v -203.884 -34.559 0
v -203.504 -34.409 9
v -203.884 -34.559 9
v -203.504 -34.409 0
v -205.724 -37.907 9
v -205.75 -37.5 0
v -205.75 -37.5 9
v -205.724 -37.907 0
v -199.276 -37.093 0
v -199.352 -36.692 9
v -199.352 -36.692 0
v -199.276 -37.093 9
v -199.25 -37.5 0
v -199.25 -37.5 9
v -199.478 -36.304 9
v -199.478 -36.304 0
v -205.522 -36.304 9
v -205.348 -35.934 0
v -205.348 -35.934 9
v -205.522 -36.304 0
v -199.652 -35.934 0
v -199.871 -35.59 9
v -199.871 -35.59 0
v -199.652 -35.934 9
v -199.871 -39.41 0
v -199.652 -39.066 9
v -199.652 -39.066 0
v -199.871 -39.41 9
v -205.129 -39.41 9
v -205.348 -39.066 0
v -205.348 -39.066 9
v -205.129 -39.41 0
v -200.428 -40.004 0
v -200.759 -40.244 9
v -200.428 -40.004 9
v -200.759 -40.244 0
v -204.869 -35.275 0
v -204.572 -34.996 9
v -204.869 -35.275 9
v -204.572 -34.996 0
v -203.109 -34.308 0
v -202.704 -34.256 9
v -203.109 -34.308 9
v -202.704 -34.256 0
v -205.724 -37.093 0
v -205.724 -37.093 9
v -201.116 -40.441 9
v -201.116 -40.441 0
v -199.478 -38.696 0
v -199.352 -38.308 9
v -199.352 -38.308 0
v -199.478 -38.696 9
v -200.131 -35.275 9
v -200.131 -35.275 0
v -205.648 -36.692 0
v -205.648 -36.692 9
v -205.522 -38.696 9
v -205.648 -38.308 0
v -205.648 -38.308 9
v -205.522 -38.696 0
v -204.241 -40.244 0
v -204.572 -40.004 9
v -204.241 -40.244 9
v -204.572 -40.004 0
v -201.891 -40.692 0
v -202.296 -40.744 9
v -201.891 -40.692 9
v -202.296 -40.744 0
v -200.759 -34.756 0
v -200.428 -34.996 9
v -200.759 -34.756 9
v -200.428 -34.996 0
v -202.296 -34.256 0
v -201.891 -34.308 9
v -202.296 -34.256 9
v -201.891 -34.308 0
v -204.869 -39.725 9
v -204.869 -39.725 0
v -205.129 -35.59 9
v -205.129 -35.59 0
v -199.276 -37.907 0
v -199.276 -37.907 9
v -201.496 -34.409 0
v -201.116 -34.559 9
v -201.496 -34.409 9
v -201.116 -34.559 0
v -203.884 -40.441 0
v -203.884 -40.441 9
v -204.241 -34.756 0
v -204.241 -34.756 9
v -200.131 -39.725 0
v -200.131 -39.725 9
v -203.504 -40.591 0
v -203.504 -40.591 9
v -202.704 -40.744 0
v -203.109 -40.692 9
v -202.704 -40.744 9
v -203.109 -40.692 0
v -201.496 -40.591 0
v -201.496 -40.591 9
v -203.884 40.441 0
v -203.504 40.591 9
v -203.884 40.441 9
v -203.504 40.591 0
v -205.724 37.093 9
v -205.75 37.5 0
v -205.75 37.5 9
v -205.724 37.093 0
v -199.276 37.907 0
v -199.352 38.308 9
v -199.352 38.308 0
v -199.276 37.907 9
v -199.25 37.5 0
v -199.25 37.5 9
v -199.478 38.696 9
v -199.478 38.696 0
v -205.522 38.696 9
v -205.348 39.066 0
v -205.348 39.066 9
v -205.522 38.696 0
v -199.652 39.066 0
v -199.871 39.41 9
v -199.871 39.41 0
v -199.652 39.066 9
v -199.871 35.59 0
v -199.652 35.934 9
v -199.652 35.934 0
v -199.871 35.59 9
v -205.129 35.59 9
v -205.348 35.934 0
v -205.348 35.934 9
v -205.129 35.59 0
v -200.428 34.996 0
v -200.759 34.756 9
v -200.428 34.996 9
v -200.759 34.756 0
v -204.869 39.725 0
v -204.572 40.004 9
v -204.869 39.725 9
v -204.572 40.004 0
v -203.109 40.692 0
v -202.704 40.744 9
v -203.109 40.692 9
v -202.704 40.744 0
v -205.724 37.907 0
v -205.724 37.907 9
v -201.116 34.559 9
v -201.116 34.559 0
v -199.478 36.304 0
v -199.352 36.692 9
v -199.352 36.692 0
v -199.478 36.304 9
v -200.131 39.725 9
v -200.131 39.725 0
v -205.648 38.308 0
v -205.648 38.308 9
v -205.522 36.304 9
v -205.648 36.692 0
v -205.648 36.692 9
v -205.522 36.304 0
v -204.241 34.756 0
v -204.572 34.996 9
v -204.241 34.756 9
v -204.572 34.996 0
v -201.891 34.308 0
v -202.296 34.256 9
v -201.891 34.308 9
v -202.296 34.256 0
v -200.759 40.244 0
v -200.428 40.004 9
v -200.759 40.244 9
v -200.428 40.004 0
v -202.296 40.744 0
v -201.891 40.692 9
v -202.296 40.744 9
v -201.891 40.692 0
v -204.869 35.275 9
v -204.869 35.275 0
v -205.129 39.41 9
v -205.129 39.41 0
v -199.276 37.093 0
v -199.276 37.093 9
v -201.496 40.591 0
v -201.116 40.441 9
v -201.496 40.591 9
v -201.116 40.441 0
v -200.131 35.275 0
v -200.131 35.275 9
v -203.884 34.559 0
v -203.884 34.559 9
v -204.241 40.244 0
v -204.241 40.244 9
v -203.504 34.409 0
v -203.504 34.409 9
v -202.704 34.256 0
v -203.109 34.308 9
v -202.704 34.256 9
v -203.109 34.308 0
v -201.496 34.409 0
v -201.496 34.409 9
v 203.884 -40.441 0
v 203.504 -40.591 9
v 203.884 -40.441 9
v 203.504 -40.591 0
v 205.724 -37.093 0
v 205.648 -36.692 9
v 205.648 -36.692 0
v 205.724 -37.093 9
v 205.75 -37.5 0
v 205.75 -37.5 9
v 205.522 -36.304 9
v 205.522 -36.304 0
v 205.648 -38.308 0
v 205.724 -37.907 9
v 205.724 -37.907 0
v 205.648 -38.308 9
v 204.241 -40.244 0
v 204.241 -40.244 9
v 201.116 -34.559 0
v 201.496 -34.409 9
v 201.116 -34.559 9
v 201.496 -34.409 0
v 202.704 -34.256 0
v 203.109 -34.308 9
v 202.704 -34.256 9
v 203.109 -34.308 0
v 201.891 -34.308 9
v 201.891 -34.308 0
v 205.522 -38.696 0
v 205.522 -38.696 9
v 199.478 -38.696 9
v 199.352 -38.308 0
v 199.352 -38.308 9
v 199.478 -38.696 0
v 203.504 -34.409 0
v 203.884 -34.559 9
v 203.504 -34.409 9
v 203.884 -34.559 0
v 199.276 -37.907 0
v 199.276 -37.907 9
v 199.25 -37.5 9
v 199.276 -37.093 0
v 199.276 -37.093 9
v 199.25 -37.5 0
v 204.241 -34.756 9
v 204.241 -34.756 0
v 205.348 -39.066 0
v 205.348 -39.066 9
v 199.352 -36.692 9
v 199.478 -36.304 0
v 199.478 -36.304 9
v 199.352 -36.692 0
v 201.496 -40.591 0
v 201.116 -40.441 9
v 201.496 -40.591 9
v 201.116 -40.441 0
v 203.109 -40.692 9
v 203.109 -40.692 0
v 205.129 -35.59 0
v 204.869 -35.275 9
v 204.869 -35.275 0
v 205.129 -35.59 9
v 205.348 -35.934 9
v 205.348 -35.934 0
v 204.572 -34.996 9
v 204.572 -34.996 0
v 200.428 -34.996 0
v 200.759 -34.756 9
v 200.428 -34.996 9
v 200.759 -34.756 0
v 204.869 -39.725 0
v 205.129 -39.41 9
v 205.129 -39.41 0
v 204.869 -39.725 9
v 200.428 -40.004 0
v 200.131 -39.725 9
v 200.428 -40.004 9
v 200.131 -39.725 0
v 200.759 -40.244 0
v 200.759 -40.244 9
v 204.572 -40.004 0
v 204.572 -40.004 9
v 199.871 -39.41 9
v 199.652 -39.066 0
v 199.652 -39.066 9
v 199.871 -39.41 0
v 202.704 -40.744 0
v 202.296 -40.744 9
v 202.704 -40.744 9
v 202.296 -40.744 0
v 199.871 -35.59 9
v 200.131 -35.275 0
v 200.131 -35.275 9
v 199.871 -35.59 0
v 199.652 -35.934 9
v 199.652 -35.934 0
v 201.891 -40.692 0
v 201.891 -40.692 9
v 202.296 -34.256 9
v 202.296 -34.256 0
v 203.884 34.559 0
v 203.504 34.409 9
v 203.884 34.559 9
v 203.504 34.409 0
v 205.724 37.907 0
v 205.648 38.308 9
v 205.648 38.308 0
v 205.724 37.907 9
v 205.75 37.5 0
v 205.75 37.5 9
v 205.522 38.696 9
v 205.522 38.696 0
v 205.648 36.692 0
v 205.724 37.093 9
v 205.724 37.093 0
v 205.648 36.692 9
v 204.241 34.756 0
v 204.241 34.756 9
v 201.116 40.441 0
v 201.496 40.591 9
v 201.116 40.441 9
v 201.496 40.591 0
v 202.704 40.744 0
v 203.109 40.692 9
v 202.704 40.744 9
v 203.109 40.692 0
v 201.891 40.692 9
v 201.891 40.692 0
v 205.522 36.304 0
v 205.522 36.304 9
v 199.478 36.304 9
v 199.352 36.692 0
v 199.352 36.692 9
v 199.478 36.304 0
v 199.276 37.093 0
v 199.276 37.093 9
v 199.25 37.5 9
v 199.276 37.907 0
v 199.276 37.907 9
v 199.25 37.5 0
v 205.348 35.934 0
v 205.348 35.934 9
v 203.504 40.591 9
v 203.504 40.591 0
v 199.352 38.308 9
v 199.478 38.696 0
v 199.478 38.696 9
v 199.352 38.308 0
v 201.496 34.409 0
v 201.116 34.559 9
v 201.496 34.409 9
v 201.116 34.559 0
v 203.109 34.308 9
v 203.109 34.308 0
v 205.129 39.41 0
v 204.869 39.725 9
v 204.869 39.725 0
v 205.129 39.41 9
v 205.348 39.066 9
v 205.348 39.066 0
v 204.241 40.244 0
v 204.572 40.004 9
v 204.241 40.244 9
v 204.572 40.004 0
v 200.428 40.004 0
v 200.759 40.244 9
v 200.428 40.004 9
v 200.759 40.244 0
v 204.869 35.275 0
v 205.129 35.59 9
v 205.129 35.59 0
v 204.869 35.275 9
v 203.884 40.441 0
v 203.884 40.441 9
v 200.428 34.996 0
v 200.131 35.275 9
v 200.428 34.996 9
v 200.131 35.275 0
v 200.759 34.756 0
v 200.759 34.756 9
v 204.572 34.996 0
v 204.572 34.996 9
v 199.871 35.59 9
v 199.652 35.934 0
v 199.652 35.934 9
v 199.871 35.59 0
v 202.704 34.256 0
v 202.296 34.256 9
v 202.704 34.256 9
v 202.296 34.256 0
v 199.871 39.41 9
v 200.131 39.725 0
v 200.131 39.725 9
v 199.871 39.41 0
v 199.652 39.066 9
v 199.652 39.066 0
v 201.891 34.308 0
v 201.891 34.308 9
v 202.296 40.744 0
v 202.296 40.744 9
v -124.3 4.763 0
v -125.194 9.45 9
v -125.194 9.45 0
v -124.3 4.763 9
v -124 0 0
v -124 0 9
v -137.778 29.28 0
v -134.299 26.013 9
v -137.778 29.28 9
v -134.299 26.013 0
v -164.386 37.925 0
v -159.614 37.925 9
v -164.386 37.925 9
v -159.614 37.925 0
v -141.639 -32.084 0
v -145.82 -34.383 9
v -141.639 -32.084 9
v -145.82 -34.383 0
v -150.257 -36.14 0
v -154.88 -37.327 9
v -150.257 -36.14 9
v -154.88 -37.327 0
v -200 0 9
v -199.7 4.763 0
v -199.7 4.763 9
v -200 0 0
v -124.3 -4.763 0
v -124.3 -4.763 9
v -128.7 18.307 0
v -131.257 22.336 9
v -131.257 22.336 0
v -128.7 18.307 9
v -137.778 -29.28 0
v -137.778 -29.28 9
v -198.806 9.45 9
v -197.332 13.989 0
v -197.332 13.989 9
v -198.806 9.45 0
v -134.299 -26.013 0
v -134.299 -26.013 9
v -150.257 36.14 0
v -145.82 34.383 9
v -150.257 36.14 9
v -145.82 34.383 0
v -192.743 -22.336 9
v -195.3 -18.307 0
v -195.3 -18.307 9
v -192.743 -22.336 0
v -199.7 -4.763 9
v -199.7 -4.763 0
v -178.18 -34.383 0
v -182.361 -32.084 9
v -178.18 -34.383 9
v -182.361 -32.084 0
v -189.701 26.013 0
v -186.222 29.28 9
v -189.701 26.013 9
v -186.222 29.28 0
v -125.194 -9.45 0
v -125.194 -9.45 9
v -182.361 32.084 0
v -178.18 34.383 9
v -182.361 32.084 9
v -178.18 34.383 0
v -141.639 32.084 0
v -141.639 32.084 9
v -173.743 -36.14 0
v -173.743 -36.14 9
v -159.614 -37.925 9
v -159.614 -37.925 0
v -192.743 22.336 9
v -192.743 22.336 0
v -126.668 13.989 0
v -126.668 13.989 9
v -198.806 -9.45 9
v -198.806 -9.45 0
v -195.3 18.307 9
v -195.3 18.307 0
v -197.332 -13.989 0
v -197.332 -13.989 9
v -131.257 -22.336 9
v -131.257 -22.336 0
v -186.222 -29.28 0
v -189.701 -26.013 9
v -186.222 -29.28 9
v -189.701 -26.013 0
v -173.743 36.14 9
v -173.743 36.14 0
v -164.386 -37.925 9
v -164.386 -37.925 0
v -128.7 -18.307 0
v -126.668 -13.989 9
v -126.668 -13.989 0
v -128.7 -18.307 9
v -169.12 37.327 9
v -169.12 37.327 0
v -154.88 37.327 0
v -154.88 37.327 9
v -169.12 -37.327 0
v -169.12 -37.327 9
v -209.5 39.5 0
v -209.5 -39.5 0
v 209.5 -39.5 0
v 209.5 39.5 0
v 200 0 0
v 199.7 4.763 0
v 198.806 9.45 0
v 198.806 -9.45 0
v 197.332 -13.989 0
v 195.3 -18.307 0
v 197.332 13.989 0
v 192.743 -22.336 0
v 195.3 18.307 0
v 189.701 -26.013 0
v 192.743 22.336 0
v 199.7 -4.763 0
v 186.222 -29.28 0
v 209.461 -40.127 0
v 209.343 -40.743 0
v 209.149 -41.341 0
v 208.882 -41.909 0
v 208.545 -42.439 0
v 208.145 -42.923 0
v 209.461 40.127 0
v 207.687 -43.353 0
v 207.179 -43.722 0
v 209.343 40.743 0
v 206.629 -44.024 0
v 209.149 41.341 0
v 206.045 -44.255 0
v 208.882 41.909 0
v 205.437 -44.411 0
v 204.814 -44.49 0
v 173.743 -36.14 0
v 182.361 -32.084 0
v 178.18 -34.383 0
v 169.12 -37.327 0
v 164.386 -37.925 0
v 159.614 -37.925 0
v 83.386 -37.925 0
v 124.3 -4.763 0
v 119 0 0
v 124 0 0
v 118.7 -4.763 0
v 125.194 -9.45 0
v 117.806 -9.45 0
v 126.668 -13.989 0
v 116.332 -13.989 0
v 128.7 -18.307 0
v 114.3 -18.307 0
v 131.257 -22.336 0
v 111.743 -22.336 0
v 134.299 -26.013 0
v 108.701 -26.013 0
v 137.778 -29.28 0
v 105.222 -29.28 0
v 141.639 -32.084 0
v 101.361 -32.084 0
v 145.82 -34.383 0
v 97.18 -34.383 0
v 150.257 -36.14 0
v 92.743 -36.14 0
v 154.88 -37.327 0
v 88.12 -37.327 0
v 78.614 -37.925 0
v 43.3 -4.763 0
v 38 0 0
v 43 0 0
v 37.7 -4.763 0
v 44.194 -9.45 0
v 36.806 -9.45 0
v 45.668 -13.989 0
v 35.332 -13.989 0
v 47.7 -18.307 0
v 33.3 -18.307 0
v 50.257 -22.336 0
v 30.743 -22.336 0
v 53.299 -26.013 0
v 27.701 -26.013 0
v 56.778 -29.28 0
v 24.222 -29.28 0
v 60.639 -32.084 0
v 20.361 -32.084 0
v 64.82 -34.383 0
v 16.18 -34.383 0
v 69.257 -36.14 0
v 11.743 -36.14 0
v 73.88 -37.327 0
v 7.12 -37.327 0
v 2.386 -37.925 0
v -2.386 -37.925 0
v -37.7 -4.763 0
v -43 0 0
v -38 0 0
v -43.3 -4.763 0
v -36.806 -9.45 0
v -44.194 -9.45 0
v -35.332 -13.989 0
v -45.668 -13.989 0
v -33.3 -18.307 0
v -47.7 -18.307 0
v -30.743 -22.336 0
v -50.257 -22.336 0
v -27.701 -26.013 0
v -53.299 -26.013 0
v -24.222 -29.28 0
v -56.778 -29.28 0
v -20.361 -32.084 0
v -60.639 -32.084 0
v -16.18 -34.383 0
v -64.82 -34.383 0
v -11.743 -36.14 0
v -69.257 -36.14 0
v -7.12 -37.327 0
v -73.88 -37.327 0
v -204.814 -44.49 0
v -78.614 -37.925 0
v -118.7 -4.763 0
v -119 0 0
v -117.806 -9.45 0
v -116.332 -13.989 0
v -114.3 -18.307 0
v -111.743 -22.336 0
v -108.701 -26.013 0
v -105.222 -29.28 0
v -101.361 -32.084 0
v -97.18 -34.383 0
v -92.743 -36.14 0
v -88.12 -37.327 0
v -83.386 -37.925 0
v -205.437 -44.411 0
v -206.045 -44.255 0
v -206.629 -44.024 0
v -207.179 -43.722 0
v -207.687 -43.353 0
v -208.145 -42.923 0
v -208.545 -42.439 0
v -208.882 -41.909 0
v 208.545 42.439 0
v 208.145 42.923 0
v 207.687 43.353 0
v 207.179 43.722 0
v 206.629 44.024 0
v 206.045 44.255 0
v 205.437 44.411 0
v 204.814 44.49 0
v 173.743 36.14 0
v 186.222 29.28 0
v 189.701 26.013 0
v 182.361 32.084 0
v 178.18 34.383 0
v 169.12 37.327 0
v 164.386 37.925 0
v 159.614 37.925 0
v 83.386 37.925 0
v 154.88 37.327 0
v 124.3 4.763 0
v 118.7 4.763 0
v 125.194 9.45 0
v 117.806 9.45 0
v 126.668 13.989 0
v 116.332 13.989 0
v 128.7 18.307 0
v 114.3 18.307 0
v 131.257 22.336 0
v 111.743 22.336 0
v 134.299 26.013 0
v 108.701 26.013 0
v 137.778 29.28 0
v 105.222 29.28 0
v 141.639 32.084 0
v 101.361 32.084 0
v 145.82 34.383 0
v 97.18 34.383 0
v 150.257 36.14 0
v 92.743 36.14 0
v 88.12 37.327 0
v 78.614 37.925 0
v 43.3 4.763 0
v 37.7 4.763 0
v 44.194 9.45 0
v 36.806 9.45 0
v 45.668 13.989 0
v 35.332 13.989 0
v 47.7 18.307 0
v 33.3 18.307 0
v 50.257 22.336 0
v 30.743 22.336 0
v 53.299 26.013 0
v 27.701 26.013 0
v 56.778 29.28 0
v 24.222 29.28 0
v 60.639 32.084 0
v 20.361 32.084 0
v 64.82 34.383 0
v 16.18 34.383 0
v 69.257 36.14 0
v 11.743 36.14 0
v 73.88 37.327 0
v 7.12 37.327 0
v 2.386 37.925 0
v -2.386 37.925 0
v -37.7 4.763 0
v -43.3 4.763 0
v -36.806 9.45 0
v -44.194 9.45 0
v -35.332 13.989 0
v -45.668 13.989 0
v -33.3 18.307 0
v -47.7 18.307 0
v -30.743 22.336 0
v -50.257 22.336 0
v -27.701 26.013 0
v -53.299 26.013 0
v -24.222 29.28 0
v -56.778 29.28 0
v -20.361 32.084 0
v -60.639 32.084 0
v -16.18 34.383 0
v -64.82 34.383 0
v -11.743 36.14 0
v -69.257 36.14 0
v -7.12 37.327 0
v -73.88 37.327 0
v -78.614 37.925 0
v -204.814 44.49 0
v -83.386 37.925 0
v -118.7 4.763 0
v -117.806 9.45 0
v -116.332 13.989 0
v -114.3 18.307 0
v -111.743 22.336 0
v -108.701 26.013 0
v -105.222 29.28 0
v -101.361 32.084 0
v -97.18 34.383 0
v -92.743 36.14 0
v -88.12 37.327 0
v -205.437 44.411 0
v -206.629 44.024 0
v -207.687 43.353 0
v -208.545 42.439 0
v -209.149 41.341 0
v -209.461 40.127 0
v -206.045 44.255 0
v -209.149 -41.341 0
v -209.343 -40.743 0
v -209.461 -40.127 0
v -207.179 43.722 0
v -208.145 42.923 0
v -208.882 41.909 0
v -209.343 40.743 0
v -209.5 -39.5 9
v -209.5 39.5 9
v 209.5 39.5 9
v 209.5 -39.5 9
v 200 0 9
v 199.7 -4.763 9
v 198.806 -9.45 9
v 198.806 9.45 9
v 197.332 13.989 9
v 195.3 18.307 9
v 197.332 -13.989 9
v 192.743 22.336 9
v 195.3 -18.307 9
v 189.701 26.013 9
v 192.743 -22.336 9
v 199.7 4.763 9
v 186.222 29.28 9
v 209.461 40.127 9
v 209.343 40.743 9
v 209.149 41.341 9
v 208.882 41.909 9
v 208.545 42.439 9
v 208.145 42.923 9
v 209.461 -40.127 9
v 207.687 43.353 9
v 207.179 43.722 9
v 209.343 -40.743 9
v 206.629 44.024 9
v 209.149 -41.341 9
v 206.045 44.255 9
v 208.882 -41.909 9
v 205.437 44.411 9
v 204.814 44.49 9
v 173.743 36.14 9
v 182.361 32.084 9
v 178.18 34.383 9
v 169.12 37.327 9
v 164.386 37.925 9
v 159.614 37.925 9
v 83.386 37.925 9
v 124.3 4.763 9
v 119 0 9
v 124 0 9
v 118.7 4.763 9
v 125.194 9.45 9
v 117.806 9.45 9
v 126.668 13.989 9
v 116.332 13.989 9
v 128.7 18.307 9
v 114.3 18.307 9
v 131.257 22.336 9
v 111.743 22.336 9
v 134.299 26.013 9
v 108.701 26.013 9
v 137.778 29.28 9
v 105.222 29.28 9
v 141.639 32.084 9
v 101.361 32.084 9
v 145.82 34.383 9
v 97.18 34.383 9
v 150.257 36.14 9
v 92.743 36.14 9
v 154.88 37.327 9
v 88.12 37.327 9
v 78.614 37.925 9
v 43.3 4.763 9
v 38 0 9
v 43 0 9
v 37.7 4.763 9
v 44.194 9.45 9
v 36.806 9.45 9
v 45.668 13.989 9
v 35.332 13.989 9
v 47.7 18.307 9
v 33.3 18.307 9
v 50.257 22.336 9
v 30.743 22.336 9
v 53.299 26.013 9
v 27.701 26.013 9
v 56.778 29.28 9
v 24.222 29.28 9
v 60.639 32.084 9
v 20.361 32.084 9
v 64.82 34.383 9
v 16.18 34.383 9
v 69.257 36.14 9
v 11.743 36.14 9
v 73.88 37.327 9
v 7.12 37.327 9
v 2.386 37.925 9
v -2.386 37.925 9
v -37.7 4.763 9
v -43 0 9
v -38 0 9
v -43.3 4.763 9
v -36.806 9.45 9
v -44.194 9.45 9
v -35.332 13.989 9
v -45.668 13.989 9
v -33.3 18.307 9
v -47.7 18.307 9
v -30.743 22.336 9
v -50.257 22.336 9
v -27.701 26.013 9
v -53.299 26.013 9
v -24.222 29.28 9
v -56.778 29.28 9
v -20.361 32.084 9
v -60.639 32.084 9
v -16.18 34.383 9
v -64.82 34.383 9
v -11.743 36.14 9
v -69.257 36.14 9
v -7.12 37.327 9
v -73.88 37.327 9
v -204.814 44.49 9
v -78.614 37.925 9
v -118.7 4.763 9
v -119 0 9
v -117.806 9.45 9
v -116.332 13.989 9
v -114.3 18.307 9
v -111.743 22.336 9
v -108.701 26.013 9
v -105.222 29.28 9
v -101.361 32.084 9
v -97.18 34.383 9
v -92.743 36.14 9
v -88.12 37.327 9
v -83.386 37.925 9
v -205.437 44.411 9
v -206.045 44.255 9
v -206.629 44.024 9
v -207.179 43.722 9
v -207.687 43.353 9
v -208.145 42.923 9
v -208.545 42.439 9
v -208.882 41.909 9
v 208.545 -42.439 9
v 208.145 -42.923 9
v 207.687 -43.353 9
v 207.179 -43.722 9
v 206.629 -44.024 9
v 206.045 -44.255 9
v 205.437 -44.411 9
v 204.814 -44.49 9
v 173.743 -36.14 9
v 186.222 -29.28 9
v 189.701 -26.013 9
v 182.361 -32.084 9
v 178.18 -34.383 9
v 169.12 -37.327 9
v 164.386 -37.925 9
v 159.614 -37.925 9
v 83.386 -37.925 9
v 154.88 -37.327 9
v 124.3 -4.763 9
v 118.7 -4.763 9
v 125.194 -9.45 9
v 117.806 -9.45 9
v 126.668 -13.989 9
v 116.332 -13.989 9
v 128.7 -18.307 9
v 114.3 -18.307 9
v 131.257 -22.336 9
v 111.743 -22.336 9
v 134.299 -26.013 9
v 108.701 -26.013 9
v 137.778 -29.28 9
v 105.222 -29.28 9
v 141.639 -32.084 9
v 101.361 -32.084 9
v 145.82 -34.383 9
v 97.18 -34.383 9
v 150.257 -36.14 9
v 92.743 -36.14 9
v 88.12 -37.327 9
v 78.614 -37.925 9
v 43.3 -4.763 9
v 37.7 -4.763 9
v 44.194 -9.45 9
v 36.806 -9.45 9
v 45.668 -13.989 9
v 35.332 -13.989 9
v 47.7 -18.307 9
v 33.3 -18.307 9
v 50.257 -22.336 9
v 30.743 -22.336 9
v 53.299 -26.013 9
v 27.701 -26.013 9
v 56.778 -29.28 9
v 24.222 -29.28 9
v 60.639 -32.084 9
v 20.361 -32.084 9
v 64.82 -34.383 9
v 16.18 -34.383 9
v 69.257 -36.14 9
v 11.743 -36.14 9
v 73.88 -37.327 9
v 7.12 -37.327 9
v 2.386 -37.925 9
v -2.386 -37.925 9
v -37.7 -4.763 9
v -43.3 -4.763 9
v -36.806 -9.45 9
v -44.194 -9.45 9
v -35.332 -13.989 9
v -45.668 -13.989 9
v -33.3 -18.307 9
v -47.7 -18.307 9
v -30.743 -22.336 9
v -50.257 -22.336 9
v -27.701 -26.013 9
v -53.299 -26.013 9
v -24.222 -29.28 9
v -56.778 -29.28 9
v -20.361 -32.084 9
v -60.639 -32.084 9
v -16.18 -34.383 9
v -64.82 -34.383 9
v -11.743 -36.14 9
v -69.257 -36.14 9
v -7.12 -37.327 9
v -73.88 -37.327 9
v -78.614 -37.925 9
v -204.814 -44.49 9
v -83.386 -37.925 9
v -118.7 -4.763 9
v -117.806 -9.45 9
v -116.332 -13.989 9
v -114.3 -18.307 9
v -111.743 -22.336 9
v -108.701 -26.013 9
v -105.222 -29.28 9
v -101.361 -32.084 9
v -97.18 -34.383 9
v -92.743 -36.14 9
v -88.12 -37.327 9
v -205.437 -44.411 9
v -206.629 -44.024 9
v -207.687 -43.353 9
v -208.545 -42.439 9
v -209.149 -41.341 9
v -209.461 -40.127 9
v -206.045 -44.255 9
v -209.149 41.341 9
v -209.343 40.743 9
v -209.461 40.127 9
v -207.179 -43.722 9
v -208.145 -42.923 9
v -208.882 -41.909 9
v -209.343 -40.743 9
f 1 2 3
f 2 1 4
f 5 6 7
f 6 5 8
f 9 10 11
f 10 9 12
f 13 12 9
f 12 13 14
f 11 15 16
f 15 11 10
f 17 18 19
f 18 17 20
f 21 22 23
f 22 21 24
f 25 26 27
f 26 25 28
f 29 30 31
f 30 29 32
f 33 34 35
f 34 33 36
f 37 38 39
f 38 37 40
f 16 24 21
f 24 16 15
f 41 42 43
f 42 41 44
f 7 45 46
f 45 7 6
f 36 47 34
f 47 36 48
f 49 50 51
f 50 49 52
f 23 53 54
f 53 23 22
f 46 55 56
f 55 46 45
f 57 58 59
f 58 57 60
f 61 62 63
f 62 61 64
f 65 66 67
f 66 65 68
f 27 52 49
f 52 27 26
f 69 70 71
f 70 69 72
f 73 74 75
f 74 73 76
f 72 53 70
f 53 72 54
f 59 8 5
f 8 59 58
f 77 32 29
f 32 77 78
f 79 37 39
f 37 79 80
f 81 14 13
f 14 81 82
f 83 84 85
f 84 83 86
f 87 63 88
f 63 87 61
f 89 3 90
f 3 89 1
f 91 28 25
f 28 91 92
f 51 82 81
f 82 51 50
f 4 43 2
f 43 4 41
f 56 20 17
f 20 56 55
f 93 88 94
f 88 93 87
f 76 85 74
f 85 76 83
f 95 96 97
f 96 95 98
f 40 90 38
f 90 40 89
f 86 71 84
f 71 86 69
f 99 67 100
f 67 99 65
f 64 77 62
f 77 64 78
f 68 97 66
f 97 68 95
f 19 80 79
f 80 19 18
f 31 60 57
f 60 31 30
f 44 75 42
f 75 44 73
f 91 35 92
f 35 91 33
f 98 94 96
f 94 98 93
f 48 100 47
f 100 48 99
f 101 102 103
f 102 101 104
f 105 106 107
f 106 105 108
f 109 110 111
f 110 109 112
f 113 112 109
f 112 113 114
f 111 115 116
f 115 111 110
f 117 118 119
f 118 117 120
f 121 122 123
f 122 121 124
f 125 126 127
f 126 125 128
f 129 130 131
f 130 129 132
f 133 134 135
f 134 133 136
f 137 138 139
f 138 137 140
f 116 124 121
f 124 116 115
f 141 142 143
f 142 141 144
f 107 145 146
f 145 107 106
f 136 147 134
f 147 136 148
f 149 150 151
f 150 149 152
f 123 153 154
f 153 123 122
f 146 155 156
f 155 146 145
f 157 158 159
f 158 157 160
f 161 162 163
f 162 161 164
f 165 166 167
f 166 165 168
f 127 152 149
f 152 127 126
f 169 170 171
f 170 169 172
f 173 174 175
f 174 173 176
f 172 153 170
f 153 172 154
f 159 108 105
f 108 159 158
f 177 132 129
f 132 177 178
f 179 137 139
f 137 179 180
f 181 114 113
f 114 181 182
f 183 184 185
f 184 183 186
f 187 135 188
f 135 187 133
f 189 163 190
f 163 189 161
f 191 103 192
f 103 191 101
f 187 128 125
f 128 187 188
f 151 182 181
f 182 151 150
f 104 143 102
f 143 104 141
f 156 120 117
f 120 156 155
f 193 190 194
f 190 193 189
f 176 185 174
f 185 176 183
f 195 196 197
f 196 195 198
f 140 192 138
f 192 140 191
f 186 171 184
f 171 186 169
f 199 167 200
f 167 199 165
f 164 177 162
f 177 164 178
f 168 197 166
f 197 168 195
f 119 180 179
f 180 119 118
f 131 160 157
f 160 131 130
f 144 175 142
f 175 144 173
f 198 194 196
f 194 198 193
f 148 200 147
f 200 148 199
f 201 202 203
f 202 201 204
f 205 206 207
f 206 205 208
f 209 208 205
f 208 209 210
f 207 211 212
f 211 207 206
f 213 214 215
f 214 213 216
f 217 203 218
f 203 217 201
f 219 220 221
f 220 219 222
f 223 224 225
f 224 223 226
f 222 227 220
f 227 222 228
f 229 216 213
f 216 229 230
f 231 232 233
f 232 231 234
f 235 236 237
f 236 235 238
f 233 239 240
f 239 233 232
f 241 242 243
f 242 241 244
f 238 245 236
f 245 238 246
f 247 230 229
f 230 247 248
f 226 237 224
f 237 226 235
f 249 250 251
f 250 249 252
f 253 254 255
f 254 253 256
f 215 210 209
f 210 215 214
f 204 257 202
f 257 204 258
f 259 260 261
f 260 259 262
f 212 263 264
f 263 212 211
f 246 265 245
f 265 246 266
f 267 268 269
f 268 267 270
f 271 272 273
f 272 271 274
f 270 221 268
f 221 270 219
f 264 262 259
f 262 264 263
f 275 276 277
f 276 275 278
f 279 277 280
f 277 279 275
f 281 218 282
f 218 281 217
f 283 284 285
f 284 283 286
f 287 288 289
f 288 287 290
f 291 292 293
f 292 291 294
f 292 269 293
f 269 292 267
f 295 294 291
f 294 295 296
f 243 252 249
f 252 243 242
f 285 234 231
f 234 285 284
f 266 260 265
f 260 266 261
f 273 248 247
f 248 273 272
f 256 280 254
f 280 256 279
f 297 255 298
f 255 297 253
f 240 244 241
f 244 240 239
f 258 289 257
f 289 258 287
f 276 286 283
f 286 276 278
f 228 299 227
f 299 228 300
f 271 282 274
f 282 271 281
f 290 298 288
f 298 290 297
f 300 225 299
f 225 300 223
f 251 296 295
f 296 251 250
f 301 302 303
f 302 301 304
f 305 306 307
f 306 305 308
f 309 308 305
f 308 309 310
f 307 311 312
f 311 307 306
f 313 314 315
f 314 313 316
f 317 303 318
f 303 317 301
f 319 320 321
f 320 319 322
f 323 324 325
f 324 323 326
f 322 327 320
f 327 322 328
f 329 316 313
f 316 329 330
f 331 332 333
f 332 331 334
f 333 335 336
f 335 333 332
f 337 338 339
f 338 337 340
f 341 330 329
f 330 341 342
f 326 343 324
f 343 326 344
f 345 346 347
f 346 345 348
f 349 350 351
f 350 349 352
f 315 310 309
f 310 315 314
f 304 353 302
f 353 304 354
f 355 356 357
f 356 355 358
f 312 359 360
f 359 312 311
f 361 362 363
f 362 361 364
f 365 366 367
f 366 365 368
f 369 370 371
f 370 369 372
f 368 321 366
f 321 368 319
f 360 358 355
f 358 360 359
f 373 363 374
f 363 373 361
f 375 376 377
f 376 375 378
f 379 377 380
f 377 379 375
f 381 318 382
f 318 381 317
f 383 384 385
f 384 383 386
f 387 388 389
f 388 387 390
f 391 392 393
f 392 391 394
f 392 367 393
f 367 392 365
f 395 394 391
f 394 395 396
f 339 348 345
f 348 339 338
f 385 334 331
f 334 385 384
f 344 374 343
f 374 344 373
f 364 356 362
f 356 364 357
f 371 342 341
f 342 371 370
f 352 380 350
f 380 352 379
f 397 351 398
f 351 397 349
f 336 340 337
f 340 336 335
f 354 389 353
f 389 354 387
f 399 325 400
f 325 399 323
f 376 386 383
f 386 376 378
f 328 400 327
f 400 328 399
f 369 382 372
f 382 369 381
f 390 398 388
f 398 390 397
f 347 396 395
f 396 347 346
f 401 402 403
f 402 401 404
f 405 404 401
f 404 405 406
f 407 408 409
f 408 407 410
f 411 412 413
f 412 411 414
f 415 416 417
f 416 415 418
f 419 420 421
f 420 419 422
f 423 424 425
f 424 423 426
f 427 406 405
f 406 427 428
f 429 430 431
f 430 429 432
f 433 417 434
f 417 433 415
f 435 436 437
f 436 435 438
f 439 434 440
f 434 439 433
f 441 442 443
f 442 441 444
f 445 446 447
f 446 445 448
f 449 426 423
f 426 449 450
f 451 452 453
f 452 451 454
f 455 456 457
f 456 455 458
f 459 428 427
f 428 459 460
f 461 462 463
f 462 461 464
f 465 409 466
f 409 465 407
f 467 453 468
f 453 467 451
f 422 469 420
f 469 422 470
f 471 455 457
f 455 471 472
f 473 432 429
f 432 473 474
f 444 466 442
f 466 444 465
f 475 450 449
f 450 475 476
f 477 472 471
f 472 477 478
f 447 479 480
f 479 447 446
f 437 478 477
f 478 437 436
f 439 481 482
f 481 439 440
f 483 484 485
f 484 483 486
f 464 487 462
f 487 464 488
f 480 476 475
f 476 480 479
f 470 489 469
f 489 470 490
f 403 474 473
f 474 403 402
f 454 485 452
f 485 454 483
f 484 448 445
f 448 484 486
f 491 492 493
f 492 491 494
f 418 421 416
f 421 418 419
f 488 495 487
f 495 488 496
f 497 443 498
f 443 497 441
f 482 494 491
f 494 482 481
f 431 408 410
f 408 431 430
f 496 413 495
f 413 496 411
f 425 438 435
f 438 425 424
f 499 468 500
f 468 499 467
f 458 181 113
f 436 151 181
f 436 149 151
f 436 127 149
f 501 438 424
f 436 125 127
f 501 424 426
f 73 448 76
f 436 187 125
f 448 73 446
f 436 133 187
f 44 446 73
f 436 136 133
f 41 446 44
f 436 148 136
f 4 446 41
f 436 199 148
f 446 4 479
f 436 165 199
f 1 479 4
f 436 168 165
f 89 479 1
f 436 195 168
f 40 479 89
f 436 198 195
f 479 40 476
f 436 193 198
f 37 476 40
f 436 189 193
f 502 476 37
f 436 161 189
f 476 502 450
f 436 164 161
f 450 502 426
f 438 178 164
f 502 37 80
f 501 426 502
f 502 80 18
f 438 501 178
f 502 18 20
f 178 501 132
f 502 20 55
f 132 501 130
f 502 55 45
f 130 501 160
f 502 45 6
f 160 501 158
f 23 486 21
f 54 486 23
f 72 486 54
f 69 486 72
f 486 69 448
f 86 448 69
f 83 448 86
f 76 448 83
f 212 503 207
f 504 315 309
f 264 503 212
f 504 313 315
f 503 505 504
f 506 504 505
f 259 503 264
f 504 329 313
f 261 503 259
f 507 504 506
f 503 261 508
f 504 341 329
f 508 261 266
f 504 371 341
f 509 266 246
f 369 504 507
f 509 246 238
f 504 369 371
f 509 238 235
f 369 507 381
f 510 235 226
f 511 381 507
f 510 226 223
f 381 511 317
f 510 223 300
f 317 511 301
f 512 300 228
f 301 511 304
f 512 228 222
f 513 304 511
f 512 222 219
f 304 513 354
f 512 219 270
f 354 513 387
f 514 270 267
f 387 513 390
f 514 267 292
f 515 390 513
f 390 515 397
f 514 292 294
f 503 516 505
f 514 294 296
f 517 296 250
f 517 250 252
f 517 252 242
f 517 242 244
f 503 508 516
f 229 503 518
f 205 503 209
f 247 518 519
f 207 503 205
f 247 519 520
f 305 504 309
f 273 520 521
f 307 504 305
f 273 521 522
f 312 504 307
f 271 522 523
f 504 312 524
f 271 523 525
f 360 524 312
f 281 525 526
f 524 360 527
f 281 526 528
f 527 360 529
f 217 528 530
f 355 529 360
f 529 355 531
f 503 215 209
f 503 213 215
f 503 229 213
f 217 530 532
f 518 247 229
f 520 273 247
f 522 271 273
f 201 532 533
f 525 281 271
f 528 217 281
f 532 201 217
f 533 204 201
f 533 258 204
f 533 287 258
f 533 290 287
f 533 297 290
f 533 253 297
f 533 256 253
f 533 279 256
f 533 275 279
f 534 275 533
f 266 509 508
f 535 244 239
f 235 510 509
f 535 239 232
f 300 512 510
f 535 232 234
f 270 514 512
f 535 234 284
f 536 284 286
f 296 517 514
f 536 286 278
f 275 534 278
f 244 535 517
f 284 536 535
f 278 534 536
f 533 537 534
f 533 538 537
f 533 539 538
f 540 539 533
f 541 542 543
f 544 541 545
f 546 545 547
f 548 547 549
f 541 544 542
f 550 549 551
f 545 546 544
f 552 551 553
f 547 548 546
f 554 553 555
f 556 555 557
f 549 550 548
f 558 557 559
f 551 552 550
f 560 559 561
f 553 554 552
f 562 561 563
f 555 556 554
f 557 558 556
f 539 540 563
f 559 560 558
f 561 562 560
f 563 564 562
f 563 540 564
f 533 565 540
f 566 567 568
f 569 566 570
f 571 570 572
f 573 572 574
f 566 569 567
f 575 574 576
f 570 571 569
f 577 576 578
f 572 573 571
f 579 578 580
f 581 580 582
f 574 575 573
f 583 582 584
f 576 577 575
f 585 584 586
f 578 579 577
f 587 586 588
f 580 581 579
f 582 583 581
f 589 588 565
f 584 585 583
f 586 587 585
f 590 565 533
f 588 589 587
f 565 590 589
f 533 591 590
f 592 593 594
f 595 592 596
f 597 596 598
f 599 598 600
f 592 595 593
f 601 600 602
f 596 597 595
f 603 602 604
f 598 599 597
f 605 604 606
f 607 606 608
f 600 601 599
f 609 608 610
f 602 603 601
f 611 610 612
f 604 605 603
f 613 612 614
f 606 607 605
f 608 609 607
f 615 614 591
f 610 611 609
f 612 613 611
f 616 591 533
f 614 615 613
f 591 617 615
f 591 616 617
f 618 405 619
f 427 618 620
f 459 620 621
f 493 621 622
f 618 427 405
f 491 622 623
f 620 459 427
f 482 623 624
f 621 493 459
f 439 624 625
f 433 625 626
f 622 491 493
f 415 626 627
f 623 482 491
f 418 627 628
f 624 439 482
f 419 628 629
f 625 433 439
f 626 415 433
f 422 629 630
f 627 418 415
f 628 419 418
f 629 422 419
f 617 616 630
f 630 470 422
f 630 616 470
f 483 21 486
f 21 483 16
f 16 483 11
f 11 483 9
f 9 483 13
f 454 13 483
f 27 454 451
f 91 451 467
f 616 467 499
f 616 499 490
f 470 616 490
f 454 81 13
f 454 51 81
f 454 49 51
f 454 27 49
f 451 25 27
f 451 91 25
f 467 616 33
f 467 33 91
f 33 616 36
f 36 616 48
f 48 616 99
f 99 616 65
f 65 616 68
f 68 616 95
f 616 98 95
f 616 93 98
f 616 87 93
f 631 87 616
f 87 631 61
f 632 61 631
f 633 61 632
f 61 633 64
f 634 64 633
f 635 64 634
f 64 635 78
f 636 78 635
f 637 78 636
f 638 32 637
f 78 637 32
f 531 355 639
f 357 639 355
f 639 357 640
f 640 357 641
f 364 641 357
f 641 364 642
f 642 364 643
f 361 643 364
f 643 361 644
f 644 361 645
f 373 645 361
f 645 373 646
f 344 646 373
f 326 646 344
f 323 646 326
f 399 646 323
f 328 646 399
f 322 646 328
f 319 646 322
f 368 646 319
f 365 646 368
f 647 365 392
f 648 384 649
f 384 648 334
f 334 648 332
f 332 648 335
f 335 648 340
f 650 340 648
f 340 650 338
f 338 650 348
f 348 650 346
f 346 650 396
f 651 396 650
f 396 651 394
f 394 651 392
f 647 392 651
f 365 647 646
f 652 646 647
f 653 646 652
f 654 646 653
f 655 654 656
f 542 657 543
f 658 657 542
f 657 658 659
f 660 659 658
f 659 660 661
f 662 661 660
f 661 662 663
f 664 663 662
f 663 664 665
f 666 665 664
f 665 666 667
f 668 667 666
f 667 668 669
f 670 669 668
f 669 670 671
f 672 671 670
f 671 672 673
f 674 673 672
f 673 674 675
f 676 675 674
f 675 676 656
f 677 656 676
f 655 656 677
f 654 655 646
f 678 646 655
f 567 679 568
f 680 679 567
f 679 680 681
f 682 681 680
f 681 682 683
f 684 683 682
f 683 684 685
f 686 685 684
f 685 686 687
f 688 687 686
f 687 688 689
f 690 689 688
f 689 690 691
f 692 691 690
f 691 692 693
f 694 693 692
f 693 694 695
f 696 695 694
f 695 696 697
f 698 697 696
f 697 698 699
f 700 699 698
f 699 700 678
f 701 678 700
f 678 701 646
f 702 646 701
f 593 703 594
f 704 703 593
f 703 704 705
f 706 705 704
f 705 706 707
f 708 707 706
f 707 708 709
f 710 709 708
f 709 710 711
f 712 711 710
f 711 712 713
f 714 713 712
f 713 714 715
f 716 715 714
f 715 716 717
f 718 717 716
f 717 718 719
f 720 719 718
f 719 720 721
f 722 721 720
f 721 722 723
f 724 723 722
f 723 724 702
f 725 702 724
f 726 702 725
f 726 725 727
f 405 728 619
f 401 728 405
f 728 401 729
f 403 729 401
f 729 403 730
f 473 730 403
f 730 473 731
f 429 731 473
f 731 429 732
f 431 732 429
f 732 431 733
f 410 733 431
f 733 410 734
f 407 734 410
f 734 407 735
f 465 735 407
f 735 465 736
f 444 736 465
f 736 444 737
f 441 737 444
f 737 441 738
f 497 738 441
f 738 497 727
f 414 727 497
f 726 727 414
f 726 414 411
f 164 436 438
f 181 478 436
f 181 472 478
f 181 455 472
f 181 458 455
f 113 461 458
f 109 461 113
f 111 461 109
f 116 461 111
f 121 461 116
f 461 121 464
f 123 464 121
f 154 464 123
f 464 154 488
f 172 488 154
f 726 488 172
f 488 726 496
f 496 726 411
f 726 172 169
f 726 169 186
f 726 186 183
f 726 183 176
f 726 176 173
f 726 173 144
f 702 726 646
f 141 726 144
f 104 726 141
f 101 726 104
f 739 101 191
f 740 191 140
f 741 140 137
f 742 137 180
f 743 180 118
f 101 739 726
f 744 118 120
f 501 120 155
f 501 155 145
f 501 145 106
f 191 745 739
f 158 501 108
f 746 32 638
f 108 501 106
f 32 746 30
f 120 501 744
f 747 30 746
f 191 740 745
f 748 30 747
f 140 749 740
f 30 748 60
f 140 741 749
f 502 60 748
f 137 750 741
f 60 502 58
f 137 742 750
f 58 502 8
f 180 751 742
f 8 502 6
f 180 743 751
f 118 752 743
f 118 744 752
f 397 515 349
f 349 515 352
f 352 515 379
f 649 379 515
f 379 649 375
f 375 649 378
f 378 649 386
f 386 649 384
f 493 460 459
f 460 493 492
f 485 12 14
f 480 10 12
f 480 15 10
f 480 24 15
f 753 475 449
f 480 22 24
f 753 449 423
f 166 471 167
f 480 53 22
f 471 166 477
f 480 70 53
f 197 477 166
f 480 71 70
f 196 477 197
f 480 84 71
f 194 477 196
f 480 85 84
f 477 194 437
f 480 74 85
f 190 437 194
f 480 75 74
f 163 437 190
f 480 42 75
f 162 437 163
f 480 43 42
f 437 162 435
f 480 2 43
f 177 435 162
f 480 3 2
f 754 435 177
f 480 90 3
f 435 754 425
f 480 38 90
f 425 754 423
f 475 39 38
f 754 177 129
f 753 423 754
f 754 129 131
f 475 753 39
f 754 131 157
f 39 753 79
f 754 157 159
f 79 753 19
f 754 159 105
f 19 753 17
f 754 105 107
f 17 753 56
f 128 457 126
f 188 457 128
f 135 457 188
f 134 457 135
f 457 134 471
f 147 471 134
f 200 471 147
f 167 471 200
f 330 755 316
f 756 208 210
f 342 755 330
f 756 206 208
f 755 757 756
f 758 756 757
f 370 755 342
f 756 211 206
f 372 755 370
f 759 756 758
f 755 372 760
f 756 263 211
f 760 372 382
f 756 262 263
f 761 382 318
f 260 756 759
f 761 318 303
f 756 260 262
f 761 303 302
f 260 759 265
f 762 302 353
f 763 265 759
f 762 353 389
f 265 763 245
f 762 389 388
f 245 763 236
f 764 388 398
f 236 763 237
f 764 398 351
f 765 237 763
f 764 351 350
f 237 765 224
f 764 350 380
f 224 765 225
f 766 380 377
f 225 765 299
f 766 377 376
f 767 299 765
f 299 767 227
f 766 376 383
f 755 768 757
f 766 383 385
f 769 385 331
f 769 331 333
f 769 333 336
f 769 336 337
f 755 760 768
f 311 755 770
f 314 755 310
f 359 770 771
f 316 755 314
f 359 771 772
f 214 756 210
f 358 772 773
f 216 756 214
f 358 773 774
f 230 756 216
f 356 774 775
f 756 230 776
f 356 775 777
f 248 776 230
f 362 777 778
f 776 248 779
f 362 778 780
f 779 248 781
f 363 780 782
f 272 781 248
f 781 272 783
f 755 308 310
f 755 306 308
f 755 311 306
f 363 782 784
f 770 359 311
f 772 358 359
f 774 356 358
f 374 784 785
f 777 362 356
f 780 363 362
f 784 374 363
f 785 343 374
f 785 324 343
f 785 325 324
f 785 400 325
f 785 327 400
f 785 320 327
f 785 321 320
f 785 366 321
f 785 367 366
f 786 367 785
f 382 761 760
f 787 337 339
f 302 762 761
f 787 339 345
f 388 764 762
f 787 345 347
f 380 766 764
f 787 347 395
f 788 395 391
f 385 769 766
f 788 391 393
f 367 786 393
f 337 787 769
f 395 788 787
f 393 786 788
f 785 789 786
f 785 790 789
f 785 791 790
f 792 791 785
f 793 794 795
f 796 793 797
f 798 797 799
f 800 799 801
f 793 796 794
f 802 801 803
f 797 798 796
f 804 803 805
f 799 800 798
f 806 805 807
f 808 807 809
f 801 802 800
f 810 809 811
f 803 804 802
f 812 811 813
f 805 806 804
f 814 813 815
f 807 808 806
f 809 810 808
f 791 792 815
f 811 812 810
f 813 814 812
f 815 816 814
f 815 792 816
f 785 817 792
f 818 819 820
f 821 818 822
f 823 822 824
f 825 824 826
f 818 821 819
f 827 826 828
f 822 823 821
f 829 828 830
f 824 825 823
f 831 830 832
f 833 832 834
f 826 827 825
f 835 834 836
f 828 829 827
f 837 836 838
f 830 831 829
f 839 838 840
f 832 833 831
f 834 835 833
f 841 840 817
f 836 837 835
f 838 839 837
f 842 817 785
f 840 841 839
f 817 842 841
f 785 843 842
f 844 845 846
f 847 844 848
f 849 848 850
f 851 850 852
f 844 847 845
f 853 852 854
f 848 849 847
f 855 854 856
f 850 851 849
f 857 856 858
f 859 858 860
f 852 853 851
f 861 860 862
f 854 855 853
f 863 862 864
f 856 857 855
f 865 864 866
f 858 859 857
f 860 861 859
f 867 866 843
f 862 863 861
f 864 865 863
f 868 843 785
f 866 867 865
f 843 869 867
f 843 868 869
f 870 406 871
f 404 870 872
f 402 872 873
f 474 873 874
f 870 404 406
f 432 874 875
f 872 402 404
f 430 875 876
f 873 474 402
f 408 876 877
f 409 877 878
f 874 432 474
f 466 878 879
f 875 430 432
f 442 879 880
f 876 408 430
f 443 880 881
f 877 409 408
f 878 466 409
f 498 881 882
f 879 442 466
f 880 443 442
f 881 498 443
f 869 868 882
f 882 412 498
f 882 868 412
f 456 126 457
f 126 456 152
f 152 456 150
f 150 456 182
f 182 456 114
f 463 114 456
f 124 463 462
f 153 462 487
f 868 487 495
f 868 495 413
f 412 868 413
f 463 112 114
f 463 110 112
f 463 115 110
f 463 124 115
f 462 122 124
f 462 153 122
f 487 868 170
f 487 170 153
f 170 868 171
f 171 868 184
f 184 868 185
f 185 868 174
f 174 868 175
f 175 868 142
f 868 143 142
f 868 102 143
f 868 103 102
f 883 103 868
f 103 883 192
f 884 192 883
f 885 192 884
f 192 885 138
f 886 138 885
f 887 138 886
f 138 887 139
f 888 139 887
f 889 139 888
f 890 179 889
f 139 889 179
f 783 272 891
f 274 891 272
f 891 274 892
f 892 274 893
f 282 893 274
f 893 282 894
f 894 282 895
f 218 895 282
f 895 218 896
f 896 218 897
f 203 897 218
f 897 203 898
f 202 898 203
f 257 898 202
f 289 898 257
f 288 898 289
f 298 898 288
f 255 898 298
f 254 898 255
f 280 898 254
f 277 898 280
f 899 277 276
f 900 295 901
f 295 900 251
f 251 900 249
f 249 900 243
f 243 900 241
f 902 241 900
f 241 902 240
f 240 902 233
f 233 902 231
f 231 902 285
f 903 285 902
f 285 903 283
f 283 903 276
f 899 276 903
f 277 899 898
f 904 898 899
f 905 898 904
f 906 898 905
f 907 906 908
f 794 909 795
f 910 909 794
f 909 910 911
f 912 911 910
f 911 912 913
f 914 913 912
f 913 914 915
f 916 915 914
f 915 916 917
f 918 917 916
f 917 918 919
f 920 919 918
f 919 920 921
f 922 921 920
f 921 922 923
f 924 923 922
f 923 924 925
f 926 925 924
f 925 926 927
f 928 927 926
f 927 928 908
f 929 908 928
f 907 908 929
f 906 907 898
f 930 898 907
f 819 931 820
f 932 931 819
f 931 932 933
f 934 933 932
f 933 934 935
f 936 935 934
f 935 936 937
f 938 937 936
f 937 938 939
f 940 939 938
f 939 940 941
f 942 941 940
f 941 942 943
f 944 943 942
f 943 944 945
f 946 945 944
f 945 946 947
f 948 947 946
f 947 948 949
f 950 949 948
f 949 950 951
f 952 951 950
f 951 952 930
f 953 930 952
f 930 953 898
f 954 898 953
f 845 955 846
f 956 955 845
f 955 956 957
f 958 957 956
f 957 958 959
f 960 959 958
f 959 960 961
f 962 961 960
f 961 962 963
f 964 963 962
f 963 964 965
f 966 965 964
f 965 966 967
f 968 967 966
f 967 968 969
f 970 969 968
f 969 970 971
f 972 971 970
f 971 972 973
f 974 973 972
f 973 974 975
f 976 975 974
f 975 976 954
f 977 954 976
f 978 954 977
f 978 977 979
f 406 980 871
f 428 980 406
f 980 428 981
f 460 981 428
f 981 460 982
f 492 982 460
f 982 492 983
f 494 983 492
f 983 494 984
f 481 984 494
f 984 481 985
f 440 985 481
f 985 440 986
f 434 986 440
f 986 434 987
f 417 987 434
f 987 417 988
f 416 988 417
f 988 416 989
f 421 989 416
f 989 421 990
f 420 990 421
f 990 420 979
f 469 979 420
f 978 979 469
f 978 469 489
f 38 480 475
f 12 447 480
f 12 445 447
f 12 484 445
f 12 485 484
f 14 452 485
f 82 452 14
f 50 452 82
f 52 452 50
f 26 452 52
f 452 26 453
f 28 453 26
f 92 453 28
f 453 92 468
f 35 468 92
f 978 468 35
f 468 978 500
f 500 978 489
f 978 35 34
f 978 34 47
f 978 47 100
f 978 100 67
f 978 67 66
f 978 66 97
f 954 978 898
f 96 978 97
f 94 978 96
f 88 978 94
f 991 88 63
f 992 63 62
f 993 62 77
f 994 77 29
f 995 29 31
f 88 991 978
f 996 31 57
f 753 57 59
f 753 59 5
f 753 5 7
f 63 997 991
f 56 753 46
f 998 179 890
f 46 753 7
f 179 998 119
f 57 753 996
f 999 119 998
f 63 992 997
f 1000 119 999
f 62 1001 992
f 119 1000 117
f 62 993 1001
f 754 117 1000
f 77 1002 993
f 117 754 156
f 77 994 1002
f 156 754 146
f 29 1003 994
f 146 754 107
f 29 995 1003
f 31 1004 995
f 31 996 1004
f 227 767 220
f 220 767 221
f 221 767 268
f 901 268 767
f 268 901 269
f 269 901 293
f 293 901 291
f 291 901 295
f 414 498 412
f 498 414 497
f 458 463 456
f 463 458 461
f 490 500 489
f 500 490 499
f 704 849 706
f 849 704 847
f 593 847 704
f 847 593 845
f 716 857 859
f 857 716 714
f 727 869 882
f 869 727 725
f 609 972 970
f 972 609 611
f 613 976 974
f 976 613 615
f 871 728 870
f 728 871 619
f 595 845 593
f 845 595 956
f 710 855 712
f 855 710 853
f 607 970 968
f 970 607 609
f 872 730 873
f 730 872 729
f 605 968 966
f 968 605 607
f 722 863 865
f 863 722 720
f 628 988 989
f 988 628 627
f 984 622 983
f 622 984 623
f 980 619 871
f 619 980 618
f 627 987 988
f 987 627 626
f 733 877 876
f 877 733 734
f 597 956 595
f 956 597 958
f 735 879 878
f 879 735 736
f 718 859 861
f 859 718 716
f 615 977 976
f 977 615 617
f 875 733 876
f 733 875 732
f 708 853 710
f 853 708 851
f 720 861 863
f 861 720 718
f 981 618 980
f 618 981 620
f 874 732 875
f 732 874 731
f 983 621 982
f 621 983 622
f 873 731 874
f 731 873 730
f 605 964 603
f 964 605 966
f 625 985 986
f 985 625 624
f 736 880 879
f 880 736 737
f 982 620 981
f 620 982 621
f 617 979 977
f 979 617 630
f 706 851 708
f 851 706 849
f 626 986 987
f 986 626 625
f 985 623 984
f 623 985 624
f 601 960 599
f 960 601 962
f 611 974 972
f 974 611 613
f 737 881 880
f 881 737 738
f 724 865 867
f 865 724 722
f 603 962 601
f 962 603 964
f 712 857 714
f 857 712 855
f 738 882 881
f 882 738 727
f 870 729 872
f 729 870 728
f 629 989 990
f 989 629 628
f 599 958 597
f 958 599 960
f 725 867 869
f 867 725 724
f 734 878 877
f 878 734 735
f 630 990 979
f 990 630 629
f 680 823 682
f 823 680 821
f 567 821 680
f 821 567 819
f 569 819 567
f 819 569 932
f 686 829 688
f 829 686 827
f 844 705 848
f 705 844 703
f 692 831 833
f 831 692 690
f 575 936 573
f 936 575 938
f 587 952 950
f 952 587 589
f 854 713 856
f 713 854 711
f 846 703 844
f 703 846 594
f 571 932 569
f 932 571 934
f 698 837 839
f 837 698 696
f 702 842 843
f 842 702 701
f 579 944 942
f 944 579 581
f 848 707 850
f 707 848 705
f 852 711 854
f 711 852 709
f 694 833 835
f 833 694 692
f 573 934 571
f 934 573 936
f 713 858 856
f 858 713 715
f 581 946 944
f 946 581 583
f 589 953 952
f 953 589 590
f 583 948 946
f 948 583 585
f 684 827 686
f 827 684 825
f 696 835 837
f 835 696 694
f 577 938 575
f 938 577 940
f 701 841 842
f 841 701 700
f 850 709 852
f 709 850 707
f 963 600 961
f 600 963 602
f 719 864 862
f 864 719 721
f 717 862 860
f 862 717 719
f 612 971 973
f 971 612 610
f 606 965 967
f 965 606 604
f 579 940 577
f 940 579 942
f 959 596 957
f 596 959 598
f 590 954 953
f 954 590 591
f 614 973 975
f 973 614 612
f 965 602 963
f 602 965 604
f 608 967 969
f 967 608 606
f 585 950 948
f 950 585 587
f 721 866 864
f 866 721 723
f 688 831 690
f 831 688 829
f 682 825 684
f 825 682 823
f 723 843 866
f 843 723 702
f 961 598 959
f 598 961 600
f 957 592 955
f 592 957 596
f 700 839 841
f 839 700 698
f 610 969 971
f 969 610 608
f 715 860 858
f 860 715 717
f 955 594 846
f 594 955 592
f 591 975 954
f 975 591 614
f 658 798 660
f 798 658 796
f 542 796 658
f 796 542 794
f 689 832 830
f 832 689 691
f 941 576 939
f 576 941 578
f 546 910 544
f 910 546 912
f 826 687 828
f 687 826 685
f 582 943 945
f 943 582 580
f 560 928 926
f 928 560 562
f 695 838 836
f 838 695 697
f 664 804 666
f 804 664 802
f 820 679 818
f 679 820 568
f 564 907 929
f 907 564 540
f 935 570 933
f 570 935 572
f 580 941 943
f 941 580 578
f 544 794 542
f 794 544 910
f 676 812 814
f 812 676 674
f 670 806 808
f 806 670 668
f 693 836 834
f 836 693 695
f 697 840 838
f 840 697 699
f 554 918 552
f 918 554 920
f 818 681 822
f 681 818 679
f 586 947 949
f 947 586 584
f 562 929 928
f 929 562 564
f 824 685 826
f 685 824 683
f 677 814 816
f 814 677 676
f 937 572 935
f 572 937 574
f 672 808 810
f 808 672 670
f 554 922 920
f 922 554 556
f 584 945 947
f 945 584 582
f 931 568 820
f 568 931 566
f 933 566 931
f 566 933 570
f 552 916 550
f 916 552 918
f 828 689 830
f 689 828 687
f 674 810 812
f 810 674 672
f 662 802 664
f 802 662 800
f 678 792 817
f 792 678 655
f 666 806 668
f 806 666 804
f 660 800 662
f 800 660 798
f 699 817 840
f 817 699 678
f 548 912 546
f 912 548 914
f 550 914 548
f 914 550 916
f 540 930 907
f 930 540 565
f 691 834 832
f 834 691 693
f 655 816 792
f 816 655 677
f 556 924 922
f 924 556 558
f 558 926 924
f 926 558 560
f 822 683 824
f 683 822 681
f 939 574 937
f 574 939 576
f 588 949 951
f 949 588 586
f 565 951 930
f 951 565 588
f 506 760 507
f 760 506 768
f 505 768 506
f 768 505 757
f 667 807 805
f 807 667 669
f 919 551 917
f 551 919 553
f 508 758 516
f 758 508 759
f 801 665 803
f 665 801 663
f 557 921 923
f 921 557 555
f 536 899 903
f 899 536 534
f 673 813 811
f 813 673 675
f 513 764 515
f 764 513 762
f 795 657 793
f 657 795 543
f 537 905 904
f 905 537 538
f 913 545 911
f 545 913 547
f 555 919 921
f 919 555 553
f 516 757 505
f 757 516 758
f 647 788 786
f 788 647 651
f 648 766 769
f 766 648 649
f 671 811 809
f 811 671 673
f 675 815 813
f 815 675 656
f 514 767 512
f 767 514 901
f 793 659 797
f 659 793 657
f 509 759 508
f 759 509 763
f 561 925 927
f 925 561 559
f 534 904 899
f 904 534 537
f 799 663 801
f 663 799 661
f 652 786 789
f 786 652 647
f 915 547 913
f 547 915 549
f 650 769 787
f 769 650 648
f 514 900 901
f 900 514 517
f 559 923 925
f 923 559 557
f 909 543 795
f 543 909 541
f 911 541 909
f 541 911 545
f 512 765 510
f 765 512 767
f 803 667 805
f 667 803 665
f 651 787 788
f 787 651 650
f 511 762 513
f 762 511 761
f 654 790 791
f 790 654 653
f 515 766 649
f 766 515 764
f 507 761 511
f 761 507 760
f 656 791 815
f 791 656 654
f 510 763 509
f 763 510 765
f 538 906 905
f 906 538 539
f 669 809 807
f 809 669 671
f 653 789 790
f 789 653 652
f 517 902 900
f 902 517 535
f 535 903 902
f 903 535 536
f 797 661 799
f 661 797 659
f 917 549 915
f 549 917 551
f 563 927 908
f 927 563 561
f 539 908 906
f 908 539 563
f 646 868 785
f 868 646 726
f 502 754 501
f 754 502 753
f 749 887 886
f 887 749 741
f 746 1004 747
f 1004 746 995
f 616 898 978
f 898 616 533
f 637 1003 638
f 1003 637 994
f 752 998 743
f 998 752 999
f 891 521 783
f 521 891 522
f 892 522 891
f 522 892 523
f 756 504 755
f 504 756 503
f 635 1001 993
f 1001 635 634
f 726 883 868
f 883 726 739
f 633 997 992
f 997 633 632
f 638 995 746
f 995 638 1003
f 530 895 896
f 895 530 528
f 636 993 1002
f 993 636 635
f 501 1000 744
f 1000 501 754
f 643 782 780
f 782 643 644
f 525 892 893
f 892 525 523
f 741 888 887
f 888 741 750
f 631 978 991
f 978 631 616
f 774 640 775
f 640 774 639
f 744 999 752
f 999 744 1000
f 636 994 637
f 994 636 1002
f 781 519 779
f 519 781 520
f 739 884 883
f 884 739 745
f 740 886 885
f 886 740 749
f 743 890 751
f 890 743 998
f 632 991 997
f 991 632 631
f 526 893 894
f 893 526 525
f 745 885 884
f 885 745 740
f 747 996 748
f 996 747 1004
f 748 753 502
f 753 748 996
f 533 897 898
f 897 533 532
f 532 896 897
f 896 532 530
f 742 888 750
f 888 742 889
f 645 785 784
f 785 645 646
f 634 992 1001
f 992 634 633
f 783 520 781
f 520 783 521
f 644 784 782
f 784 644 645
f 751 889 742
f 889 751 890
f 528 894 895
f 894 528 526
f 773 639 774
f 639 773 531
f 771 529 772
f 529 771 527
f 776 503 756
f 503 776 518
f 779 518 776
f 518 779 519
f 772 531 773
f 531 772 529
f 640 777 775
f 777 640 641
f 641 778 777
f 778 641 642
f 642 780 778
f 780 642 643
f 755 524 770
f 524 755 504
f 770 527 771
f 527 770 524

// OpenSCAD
$fn = 50;


difference() {
	union() {
		hull() {
			translate(v = [-204.5000000000, 39.5000000000, 0]) {
				cylinder(h = 9, r = 5);
			}
			translate(v = [204.5000000000, 39.5000000000, 0]) {
				cylinder(h = 9, r = 5);
			}
			translate(v = [-204.5000000000, -39.5000000000, 0]) {
				cylinder(h = 9, r = 5);
			}
			translate(v = [204.5000000000, -39.5000000000, 0]) {
				cylinder(h = 9, r = 5);
			}
		}
	}
	union() {
		#translate(v = [-202.5000000000, -37.5000000000, -100.0000000000]) {
			cylinder(h = 200, r = 3.2500000000);
		}
		#translate(v = [-202.5000000000, 37.5000000000, -100.0000000000]) {
			cylinder(h = 200, r = 3.2500000000);
		}
		#translate(v = [202.5000000000, -37.5000000000, -100.0000000000]) {
			cylinder(h = 200, r = 3.2500000000);
		}
		#translate(v = [202.5000000000, 37.5000000000, -100.0000000000]) {
			cylinder(h = 200, r = 3.2500000000);
		}
		#translate(v = [-162.0000000000, 0, 0]) {
			cylinder(h = 9, r = 38.0000000000);
		}
		#translate(v = [-81.0000000000, 0, 0]) {
			cylinder(h = 9, r = 38.0000000000);
		}
		#cylinder(h = 9, r = 38.0000000000);
		#translate(v = [81.0000000000, 0, 0]) {
			cylinder(h = 9, r = 38.0000000000);
		}
		#translate(v = [162.0000000000, 0, 0]) {
			cylinder(h = 9, r = 38.0000000000);
		}
	}
}
